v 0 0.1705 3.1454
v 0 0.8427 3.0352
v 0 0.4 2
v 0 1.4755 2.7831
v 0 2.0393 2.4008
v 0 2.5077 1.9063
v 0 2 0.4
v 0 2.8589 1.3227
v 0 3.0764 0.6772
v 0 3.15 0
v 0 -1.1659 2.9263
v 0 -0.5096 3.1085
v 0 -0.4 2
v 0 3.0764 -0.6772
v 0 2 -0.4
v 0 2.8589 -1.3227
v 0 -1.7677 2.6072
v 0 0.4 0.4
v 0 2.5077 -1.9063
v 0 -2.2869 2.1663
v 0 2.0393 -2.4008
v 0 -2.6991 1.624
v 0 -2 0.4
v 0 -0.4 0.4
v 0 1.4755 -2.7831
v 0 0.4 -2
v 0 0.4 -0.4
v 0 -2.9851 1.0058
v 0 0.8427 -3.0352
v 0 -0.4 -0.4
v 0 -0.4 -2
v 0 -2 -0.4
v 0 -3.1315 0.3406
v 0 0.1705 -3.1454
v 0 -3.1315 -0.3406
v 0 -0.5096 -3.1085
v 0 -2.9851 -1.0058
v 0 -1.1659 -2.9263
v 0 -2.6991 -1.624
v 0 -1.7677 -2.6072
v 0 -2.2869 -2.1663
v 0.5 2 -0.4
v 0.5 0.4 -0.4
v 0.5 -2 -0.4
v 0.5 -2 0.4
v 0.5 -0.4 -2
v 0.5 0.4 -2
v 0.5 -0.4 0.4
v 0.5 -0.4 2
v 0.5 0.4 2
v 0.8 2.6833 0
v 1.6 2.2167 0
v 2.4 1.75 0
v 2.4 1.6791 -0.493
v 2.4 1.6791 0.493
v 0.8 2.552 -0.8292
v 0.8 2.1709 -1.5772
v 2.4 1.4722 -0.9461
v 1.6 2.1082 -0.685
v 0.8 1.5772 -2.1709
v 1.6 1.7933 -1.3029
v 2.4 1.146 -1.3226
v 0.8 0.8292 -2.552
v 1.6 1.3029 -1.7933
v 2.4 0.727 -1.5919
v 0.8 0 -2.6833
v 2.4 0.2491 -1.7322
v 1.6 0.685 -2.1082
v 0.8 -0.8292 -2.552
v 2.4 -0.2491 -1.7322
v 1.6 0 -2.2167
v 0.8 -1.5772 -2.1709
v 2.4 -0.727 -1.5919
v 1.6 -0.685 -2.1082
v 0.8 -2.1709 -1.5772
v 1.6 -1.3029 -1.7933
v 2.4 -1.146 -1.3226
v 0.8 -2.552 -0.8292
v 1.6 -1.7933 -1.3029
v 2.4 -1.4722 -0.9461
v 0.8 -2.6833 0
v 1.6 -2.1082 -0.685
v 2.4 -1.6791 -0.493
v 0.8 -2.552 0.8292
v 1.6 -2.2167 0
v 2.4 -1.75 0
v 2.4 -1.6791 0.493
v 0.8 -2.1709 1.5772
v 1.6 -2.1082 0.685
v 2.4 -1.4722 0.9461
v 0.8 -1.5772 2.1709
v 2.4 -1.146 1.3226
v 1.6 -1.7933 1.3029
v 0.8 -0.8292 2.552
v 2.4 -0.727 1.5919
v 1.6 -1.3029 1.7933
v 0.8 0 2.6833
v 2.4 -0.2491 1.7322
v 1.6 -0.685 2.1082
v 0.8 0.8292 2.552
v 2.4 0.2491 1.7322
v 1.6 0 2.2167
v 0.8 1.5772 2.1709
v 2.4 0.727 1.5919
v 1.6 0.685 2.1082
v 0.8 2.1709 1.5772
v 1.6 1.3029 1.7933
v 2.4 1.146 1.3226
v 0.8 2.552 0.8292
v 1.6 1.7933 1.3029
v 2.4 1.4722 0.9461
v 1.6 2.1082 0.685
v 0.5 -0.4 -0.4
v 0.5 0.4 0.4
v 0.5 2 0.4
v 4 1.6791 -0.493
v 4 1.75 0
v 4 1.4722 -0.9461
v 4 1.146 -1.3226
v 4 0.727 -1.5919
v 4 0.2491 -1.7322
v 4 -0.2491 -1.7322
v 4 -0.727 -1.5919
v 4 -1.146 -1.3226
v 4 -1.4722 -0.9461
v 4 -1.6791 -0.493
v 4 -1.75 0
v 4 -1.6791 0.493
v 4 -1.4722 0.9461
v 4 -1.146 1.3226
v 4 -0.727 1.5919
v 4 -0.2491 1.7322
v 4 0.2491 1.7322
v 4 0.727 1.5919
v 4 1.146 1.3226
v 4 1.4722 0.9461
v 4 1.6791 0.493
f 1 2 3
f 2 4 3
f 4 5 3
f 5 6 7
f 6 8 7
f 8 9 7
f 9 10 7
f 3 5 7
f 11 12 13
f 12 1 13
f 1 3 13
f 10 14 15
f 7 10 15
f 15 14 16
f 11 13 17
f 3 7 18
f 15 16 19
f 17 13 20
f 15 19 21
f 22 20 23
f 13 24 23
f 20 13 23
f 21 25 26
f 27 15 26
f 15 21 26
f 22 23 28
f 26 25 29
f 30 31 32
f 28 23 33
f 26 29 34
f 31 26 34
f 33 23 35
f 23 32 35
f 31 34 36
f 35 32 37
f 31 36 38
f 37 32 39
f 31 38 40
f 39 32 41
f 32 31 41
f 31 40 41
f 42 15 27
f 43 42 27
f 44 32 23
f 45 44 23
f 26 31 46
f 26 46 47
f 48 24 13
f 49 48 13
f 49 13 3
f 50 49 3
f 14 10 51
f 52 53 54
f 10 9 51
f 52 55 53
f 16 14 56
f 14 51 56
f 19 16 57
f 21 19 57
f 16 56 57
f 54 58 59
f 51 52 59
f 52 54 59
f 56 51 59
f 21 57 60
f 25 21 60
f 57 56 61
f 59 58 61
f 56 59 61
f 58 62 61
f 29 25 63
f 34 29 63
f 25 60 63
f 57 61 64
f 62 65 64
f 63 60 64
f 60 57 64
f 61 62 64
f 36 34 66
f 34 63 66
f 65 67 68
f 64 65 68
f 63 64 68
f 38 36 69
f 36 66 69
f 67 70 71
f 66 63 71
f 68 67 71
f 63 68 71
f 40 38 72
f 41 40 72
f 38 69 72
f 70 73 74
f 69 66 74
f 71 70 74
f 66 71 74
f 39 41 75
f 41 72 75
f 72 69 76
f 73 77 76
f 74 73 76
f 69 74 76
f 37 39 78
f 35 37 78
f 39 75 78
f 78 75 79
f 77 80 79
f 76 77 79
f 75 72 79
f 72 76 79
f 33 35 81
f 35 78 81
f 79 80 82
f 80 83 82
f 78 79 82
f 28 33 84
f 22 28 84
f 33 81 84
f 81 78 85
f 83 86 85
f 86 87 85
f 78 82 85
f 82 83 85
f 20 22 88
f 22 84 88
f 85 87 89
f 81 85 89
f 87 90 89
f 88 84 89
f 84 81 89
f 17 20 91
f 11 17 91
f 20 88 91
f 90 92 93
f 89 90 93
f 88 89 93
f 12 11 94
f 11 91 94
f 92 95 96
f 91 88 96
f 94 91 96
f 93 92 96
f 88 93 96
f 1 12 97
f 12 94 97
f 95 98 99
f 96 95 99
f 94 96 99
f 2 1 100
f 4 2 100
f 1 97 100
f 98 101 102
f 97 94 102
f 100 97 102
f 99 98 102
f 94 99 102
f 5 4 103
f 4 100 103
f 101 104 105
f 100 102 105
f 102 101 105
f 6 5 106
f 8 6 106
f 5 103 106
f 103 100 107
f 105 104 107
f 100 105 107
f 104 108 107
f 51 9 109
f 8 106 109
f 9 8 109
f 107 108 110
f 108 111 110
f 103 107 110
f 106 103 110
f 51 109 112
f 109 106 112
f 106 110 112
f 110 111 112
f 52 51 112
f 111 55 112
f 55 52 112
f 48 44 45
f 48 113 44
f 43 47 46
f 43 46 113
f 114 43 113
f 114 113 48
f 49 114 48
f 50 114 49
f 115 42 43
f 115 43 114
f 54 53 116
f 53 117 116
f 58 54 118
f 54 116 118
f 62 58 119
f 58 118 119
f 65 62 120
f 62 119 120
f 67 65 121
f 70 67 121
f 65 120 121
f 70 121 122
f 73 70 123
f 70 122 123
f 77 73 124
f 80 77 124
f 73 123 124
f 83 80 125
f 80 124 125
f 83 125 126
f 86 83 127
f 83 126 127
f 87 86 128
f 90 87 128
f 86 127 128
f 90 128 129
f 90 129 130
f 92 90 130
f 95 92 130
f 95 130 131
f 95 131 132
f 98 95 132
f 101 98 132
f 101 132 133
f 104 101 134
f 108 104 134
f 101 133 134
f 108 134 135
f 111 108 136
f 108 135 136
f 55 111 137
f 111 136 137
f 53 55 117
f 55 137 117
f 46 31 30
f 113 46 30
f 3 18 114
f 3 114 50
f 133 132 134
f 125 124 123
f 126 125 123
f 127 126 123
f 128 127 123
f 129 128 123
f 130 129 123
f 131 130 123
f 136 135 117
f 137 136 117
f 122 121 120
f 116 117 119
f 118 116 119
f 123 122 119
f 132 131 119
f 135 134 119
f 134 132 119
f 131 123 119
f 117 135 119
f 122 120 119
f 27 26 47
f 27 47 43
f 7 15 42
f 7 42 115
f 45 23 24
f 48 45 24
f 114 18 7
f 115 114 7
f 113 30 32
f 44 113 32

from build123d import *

# Parameters (mm, degrees)
SKETCH_2_W          = 0.8
SKETCH_2_H          = 1.6
SKETCH_2_W_2        = 1.6
SKETCH_2_H_2        = 0.8
CUT_EXTRUDE_1_DEPTH = 0.5


with BuildPart() as part:
    # 草图1 → 旋转1 (revolve)
    with BuildSketch(Plane.XY):
        Polygon((0, 0), (0, 3.15), (2.4, 1.75), (4, 1.75), (4, 0), align=None)
    revolve(axis=Axis((4, 0, 0), (-1, 0, 0)))

    # 草图2 → 切除-拉伸1 (cut)
    with BuildSketch(Plane.ZY):
        with Locations((0, -1.2)):
            Rectangle(SKETCH_2_W, SKETCH_2_H)
        with Locations((1.2, 0)):
            Rectangle(SKETCH_2_W_2, SKETCH_2_H_2)
        with Locations((0, 1.2)):
            Rectangle(SKETCH_2_W, SKETCH_2_H)
        Rectangle(SKETCH_2_W, SKETCH_2_H_2)
        with Locations((-1.2, 0)):
            Rectangle(SKETCH_2_W_2, SKETCH_2_H_2)
    extrude(amount=-CUT_EXTRUDE_1_DEPTH, mode=Mode.SUBTRACT)


solid = part.part
